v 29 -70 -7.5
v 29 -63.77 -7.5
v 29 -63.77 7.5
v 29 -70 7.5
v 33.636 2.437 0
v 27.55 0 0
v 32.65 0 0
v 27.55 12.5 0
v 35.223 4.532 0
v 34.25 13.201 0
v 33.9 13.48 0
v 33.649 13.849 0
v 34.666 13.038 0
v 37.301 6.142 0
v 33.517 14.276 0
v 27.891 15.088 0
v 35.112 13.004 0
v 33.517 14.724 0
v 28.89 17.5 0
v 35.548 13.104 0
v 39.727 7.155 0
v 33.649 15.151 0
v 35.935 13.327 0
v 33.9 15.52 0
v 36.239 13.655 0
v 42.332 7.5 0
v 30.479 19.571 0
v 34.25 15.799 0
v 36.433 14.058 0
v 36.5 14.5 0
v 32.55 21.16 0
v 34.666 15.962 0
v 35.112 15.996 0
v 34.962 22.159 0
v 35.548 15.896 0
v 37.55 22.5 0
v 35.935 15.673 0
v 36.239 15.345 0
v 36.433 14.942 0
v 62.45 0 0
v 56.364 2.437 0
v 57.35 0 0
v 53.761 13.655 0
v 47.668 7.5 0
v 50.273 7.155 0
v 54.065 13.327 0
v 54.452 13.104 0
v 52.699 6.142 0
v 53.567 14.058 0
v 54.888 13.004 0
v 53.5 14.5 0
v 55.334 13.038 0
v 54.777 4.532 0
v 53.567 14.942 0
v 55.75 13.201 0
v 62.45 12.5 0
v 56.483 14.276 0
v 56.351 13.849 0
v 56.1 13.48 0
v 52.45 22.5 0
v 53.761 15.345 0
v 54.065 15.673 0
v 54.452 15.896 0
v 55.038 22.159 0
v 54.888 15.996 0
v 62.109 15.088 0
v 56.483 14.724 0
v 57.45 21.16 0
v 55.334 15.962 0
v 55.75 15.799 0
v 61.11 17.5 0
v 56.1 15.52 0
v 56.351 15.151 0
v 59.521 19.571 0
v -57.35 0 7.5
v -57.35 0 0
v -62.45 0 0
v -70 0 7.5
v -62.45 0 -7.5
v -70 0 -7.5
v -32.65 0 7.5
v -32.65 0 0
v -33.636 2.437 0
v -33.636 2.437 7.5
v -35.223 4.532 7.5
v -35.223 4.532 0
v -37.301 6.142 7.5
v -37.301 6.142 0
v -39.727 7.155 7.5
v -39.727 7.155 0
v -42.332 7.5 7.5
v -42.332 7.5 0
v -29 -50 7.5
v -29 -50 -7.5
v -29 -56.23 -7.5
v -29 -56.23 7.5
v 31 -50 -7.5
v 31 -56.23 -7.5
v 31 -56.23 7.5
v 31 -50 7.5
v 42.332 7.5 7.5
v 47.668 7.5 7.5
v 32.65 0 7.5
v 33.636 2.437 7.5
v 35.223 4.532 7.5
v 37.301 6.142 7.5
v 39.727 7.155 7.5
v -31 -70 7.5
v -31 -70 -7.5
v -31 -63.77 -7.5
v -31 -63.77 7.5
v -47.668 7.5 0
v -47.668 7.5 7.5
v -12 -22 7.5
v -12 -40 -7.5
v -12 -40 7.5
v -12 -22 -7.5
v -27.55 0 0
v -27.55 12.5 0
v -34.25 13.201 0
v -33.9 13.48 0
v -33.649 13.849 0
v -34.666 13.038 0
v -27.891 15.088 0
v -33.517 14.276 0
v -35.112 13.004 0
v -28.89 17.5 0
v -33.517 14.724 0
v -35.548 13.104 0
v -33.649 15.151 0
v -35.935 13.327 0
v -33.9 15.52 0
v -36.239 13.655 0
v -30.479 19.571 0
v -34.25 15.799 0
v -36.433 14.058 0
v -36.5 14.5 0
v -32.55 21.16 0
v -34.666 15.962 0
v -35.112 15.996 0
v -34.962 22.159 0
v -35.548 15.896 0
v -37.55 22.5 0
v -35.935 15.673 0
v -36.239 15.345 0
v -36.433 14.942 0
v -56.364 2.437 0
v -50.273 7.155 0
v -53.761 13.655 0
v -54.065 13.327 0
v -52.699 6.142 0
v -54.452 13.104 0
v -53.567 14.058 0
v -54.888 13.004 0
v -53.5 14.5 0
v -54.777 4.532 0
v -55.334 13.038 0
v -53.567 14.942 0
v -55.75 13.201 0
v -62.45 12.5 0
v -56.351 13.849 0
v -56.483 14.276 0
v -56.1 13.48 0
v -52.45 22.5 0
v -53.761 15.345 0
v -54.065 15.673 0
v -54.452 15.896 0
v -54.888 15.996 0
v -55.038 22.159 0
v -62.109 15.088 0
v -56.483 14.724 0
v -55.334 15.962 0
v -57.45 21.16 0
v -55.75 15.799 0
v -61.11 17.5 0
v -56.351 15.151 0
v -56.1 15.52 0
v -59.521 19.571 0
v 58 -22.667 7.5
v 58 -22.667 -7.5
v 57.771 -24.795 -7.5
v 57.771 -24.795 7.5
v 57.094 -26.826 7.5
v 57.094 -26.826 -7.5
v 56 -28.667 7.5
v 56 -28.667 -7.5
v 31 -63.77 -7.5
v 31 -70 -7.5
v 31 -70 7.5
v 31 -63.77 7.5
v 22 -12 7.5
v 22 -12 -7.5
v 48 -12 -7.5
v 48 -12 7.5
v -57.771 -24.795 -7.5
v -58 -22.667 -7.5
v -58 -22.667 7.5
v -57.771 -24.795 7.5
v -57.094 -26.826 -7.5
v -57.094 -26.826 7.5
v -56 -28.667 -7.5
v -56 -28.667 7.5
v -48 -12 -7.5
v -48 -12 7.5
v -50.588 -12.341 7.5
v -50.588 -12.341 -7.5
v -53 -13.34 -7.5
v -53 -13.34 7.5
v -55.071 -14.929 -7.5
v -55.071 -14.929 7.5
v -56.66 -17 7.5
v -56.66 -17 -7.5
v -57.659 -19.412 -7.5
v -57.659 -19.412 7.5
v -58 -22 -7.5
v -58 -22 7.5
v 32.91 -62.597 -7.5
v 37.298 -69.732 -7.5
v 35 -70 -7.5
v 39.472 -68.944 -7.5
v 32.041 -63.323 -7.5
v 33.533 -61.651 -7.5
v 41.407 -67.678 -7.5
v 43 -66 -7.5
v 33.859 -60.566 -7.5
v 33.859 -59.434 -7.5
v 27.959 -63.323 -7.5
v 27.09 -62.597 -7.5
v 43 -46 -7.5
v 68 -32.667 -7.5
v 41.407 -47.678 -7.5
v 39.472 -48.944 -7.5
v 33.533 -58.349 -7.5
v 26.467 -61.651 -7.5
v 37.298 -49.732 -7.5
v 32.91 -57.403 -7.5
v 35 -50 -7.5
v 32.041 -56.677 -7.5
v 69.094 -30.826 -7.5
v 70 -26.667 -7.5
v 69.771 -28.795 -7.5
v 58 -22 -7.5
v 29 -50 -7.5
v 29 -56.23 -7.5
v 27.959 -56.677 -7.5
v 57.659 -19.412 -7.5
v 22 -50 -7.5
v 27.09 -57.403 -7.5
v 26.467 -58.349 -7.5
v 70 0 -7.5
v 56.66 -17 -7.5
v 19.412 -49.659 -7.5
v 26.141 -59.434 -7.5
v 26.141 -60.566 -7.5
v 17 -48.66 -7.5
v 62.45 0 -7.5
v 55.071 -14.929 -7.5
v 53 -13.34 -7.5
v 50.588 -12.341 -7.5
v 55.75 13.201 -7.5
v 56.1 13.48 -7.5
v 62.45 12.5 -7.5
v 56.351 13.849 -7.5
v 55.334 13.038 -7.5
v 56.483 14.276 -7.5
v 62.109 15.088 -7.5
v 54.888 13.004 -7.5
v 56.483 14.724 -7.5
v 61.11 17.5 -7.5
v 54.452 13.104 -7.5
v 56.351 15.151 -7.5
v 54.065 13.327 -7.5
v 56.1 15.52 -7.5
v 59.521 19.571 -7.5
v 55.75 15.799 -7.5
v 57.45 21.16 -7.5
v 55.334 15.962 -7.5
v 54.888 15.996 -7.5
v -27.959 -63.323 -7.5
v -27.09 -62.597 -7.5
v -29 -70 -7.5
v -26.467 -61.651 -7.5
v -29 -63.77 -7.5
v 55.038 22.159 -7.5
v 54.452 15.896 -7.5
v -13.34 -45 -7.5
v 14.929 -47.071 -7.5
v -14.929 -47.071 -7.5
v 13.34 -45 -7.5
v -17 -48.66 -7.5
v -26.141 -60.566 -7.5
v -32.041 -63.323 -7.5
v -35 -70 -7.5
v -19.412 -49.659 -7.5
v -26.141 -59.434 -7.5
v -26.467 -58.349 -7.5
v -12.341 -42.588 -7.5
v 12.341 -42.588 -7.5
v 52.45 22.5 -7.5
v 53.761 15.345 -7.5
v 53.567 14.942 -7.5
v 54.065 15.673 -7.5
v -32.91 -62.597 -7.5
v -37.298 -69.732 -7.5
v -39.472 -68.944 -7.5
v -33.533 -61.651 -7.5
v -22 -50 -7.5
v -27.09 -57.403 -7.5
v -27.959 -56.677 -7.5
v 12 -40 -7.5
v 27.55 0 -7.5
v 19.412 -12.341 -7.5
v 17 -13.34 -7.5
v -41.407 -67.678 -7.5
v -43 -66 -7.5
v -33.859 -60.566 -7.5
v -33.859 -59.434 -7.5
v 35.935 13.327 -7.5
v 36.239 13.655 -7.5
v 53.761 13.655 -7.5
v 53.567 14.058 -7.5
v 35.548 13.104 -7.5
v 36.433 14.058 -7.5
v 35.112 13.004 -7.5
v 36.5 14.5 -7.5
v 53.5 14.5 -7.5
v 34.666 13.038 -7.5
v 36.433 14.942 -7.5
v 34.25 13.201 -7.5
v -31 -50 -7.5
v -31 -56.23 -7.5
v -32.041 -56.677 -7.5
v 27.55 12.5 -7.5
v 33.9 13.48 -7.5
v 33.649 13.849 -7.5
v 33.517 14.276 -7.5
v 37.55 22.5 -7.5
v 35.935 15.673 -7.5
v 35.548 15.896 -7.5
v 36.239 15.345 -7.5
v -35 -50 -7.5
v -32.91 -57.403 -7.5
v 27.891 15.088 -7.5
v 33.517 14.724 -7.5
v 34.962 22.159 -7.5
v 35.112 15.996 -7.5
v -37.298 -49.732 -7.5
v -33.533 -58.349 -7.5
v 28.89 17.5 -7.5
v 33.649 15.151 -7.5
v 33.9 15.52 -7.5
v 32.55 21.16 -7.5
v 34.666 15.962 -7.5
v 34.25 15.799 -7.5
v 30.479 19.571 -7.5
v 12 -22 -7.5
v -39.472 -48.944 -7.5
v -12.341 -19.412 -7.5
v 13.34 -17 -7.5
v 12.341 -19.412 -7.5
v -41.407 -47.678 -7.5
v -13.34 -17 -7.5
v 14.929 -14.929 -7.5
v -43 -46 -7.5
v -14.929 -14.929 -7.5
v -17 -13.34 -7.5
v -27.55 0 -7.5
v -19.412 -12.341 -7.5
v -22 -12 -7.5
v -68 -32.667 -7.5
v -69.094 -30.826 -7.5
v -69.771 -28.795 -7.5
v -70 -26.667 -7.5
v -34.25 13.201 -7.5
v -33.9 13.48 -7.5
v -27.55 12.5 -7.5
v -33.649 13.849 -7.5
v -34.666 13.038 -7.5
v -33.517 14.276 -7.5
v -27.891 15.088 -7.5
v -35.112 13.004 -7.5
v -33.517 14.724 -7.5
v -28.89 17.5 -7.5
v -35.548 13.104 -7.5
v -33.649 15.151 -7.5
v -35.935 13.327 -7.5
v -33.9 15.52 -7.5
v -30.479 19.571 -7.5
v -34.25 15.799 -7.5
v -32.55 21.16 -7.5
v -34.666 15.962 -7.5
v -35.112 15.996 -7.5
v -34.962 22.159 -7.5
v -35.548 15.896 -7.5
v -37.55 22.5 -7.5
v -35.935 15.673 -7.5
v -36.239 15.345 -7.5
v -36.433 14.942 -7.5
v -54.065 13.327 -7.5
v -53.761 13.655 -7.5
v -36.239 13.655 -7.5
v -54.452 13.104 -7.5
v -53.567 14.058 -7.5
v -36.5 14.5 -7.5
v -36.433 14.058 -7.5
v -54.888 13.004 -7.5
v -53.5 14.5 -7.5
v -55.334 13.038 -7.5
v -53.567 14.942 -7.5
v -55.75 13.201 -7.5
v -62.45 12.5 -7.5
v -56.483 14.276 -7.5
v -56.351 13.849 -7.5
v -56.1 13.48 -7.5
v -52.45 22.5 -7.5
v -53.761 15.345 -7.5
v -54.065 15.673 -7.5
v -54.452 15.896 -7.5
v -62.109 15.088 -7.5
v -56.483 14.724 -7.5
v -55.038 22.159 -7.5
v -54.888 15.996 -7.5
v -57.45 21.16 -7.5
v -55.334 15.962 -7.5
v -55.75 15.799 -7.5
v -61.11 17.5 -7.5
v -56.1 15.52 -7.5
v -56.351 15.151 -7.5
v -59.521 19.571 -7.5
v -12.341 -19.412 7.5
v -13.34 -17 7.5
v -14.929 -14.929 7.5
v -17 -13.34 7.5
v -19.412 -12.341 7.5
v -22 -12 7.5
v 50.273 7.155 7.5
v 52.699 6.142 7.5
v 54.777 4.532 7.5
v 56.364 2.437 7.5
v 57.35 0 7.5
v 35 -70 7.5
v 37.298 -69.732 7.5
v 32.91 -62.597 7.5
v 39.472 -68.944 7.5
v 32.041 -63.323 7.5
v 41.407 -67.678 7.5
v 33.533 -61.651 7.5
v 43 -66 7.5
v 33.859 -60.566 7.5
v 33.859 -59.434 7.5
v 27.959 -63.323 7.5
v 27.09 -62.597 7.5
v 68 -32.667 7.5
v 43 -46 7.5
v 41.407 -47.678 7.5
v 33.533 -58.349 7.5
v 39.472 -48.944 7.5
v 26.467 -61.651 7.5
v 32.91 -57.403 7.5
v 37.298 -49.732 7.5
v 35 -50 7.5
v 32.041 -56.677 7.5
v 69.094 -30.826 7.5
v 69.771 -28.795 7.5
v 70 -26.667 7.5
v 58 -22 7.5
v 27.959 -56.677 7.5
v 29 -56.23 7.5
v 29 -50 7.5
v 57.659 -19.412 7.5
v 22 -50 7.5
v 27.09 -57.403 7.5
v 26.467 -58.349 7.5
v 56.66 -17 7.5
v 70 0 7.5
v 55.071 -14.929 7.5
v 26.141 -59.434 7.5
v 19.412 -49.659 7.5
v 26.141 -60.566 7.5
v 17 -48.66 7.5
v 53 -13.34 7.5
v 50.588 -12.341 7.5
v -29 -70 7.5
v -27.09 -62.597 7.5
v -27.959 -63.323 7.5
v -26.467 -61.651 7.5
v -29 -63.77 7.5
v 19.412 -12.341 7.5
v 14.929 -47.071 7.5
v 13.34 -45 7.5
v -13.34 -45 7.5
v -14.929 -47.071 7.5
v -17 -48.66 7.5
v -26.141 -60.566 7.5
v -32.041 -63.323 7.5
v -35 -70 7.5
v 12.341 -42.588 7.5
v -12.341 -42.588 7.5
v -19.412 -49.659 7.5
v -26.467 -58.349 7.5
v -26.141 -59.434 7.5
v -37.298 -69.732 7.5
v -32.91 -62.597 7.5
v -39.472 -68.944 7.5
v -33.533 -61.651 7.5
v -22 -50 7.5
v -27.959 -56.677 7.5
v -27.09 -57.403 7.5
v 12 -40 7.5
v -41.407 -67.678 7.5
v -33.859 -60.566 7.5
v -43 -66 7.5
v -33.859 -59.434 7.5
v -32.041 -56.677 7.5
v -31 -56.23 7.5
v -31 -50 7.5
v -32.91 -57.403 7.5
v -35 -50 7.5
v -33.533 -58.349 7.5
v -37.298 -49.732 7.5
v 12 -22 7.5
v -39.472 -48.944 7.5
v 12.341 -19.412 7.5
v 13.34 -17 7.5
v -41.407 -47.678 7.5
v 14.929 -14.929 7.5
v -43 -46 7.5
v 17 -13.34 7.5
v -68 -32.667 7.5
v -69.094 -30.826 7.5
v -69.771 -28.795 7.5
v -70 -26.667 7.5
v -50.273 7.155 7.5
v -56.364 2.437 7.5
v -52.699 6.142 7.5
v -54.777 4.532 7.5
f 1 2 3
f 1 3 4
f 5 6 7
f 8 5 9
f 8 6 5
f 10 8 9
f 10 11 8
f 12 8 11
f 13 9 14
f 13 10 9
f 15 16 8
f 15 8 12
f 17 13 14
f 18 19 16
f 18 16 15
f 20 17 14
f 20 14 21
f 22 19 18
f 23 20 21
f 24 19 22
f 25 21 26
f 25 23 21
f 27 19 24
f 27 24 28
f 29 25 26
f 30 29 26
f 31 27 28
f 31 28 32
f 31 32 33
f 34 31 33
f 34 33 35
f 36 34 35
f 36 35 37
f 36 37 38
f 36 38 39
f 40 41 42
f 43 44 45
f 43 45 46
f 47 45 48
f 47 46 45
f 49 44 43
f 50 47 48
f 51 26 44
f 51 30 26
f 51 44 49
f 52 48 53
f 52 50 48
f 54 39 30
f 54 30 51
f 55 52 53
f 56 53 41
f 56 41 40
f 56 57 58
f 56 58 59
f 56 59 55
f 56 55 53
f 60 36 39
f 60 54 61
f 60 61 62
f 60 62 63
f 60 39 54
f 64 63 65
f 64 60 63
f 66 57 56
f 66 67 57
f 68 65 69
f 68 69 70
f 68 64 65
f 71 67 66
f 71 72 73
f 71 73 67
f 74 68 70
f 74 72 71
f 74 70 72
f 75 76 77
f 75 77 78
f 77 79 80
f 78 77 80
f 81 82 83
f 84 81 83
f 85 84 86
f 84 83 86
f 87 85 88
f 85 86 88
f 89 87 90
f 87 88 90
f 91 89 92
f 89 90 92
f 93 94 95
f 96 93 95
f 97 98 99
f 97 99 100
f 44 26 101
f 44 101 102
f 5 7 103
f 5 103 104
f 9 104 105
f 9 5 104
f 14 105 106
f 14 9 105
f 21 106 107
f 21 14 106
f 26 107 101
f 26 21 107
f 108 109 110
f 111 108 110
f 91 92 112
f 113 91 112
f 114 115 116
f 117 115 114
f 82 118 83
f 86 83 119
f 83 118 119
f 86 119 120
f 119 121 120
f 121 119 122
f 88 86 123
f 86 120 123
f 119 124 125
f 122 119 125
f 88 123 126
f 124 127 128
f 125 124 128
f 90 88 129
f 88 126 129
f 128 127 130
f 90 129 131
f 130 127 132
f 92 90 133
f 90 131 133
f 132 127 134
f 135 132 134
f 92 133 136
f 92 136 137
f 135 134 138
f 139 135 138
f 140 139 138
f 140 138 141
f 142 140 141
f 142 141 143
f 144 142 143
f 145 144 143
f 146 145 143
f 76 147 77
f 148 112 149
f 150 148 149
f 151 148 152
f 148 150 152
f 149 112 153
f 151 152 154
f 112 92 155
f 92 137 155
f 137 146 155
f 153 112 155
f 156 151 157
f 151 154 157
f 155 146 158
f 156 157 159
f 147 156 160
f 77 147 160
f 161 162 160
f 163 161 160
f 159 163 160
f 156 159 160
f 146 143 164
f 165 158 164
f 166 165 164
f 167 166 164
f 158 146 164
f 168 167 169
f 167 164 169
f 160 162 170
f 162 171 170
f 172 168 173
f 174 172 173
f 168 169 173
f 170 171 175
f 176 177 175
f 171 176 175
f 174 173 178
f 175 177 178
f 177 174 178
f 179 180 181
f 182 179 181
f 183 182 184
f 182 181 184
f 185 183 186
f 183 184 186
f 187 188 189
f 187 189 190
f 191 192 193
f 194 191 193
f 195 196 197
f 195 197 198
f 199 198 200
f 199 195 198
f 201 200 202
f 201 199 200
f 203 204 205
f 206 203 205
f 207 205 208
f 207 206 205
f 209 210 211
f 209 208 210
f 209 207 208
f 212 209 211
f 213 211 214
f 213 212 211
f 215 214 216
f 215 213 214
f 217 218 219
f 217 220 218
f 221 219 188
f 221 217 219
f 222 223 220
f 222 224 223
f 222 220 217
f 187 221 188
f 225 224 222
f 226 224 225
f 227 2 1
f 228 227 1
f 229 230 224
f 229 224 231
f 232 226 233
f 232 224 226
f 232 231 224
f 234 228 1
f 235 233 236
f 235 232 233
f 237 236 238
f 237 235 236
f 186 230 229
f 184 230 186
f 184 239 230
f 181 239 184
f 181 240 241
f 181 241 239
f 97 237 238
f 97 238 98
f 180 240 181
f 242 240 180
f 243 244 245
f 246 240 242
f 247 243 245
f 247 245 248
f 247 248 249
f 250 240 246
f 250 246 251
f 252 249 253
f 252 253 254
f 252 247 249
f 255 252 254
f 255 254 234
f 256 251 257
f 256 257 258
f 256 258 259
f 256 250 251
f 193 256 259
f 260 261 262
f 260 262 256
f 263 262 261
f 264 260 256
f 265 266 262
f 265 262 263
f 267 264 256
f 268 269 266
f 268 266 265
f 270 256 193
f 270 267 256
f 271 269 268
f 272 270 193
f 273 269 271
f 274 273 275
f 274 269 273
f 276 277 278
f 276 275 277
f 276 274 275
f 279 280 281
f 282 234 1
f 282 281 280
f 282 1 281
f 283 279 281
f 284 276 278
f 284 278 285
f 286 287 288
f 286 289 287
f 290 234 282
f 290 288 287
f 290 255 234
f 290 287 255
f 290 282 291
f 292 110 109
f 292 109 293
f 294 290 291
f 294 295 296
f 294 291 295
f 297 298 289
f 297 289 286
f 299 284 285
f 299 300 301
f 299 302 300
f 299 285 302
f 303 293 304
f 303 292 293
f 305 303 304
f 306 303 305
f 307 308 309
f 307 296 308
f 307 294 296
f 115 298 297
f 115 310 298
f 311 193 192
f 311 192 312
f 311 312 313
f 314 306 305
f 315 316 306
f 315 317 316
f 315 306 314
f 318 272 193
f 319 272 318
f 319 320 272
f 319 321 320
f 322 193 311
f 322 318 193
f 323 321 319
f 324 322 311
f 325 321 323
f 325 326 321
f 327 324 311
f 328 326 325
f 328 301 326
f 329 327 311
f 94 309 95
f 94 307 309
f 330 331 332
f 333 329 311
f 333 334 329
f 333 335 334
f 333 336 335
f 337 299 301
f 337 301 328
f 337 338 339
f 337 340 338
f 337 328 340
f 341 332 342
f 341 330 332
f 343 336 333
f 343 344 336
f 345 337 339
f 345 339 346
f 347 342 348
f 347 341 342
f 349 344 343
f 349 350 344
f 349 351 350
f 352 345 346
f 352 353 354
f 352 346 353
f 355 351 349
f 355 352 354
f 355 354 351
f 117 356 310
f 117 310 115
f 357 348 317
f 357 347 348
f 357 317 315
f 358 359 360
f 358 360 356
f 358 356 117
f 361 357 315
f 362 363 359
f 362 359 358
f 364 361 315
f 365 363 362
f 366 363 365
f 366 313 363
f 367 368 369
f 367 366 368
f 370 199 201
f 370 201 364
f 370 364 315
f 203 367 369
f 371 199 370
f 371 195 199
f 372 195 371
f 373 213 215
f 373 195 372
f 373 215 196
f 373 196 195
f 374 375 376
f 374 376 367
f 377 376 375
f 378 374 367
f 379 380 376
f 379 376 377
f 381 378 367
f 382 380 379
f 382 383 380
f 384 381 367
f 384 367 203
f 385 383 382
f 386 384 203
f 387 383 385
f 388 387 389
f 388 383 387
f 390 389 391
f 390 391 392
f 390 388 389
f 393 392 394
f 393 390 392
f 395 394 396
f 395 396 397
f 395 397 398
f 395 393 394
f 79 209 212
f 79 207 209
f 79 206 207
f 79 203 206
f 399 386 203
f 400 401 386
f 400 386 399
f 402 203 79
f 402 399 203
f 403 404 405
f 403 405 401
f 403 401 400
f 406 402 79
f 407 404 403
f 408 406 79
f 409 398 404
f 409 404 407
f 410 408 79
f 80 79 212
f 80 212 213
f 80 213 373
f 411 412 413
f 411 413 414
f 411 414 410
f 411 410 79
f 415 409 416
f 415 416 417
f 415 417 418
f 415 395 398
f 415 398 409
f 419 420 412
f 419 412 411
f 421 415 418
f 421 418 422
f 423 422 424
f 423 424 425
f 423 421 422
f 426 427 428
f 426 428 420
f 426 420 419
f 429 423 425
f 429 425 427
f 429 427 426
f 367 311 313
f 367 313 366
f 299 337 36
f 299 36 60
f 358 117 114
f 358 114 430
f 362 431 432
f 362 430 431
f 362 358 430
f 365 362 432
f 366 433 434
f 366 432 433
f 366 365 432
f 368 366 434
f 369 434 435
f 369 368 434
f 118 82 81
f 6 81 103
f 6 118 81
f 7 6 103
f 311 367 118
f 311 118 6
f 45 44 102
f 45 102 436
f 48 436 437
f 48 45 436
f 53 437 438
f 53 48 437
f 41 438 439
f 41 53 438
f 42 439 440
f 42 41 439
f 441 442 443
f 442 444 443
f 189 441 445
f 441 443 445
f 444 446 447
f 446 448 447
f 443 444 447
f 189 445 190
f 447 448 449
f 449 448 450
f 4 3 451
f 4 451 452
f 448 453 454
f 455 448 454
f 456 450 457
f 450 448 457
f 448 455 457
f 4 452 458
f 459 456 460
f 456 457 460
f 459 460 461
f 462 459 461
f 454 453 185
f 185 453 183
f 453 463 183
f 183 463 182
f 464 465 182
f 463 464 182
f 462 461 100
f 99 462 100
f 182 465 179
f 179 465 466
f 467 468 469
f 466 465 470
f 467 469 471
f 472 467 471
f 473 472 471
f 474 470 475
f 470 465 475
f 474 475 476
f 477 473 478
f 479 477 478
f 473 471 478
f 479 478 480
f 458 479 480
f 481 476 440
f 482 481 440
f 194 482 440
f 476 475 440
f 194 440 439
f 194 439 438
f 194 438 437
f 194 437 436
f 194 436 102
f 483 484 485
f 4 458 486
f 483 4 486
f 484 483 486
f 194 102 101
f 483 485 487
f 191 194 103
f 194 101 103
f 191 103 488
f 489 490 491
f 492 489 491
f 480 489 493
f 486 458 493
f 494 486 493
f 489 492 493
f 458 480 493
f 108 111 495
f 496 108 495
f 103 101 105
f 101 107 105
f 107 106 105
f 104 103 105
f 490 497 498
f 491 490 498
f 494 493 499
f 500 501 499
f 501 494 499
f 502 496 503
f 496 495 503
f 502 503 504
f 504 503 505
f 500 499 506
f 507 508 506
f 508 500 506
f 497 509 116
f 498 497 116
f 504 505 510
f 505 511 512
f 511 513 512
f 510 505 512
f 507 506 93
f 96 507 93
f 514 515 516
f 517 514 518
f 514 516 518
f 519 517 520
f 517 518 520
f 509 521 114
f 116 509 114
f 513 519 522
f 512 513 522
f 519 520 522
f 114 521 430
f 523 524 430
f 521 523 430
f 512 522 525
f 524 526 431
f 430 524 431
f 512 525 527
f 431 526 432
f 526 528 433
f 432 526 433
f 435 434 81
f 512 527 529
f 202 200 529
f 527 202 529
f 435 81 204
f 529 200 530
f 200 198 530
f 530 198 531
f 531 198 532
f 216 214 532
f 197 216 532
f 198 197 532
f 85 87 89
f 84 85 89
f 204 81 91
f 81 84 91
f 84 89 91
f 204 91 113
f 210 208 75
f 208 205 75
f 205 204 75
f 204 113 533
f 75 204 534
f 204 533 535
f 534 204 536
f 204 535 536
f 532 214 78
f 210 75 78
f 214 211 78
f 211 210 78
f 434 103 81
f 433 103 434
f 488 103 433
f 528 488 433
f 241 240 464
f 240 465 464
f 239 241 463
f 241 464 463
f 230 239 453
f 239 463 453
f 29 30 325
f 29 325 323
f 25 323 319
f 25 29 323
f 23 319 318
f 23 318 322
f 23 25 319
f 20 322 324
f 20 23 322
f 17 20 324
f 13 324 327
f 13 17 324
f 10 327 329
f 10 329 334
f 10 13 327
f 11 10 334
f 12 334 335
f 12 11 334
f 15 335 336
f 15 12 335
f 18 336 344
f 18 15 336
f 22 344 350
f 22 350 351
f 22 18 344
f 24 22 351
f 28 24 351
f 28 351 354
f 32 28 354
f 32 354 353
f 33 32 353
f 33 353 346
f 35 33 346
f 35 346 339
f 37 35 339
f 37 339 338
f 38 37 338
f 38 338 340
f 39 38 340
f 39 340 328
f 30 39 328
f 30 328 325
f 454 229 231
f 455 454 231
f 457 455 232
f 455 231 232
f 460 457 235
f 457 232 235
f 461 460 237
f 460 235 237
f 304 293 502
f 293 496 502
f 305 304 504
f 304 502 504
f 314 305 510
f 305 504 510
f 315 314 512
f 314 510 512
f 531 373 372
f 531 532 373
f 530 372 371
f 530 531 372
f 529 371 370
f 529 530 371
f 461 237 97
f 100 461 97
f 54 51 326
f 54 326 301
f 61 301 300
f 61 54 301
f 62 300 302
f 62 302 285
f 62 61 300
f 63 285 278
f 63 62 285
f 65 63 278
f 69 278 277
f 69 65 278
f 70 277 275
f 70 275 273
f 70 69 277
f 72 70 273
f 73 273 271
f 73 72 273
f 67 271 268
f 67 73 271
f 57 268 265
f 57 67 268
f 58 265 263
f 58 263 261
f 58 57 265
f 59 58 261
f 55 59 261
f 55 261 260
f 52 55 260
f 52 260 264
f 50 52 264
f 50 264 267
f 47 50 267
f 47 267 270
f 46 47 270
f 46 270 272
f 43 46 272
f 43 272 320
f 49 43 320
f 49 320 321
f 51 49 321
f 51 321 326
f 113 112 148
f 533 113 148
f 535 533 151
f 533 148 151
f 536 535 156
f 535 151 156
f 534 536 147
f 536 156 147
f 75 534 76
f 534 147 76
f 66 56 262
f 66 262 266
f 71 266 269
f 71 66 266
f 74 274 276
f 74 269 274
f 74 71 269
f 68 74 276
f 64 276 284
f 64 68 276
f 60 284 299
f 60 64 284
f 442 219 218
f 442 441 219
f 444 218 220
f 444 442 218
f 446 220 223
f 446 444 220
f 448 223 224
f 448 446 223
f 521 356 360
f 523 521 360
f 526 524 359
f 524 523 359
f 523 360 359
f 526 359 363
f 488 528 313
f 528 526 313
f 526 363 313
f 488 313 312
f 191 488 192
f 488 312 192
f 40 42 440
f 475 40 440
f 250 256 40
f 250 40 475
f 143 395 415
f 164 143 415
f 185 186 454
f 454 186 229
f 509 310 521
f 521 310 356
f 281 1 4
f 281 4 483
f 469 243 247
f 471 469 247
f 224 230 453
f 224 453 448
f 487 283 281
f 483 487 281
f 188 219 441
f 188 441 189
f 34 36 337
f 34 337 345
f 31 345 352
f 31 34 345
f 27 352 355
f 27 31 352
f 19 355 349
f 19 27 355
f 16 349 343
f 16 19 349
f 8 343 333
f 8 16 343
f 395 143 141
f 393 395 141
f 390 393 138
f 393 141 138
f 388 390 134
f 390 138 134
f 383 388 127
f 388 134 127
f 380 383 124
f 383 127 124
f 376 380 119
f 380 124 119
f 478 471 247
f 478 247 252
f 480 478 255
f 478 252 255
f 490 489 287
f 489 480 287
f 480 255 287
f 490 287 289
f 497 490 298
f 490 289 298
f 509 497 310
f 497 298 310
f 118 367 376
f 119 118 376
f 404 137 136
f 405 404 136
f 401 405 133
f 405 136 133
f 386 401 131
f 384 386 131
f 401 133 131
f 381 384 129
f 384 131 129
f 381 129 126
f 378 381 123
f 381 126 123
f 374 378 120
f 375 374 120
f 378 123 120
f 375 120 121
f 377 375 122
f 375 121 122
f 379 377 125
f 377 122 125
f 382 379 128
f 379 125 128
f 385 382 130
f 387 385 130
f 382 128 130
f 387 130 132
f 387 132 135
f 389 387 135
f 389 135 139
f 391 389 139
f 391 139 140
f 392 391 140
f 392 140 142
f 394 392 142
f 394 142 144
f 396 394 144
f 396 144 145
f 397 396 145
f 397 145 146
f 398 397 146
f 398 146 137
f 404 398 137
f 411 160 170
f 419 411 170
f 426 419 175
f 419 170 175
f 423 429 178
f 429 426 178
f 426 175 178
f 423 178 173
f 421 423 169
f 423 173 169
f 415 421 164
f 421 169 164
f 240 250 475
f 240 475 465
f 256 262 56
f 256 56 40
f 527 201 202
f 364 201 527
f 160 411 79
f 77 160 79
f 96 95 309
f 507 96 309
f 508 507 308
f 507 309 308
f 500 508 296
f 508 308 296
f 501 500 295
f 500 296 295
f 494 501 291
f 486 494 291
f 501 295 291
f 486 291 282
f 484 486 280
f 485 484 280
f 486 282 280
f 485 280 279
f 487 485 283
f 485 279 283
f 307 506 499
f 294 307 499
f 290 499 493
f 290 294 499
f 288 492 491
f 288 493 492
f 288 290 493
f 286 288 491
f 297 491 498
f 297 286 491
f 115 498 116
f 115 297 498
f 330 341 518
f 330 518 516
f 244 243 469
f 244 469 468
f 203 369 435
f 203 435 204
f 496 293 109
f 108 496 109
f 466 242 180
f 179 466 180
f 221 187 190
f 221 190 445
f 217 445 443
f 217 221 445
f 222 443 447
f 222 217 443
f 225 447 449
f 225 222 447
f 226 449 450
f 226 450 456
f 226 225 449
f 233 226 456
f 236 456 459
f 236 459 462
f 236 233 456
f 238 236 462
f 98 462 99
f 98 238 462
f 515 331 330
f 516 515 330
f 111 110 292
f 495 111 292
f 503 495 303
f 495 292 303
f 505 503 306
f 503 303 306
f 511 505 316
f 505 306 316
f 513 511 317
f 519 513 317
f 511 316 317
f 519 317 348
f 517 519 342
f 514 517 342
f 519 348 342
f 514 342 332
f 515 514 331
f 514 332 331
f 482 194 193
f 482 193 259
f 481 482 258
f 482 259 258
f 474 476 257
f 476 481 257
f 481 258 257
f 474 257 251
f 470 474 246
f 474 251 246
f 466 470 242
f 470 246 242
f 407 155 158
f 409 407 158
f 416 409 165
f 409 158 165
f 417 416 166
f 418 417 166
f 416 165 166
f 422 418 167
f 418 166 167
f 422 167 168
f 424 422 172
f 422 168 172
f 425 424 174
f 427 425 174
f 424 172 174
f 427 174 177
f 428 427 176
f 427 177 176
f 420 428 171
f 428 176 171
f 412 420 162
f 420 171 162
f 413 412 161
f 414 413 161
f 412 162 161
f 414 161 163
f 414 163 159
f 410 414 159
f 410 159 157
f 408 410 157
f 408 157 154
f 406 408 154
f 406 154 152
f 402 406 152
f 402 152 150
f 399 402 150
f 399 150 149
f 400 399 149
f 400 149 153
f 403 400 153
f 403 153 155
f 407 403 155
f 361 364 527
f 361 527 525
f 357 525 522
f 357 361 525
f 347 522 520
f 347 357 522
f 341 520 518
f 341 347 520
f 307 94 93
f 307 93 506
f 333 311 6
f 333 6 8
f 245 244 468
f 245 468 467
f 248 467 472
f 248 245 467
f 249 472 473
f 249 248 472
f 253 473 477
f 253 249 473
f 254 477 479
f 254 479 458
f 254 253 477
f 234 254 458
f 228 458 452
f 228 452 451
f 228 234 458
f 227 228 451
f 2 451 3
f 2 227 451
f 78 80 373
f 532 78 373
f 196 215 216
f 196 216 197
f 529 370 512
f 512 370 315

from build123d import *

# Parameters (mm, degrees)
BOSS_EXTRU_1_DEPTH           = 7.5
BOSS_EXTRU_1_DEPTH_BACK      = 7.5
ENL_V_MAT_EXTRU_1_DEPTH      = 7.5
CONG_1_R                     = 10
CONG_2_R                     = 10
ENL_V_MAT_EXTRU_3_DEPTH      = 100.278648258
ENL_V_MAT_EXTRU_3_DEPTH_BACK = 100.278648258
ENL_V_MAT_EXTRU_2_DEPTH      = 100.278648258
ENL_V_MAT_EXTRU_2_DEPTH_BACK = 100.278648258
ESQUISSE8_R                  = 1.5
ENL_V_MAT_EXTRU_4_DEPTH      = 100.278648258


with BuildPart() as part:
    # Esquisse1 → Boss.-Extru.1 (new, two sides: drawn at the far end of the back side and taken through both)
    with BuildSketch(Plane.XY.offset(-BOSS_EXTRU_1_DEPTH_BACK)):
        Polygon((-62.45, 0), (-70, 0), (-70, -30), (-40, -70), (0, -70), (0, 0), (-27.55, 0), (-27.55, 22.5), (-62.45, 22.5), align=None)
    extrude(amount=BOSS_EXTRU_1_DEPTH + BOSS_EXTRU_1_DEPTH_BACK)

    # Esquisse3 → Enlèv. mat.-Extru.1 (cut)
    with BuildSketch(Plane.XY):
        Polygon((-32.65, 0), (-32.65, 7.5), (-57.35, 7.5), (-57.35, 0), (-62.45, 0), (-62.45, 22.5), (-27.55, 22.5), (-27.55, 0), align=None)
    extrude(amount=ENL_V_MAT_EXTRU_1_DEPTH, mode=Mode.SUBTRACT)

    # Congé1
    # the kernel refuses this fillet: 10 mm, written as the material it takes off along each edge
    with BuildSketch(Plane(origin=(-62.45, 22.5, 25), x_dir=(1, 0, 0), z_dir=(0, 0, -1))) as cong_1_piece_1:
        with BuildLine():
            CenterArc((CONG_1_R, CONG_1_R), CONG_1_R, 180, 90)
            Line((0, CONG_1_R), (0, 0))
            Line((0, 0), (CONG_1_R, 0))
        make_face()
    extrude(amount=57.5, mode=Mode.SUBTRACT)
    with BuildSketch(Plane(origin=(-57.35, 7.5, 0), x_dir=(1, 0, 0), z_dir=(0, 0, 1))) as cong_1_piece_2:
        with BuildLine():
            CenterArc((9.682458366, -10), CONG_1_R, 90, 75.522487814)
            Line((0, -7.5), (0, 0))
            Line((0, 0), (9.682458366, 0))
        make_face()
    extrude(amount=31.706145914, mode=Mode.SUBTRACT)
    with BuildSketch(Plane(origin=(-32.65, 7.5, 0), x_dir=(0, -1, 0), z_dir=(0, 0, 1))) as cong_1_piece_3:
        with BuildLine():
            CenterArc((10, -9.682458366), CONG_1_R, 104.477512186, 75.522487814)
            Line((0, -9.682458366), (0, 0))
            Line((0, 0), (7.5, 0))
        make_face()
    extrude(amount=31.706145914, mode=Mode.SUBTRACT)
    with BuildSketch(Plane(origin=(-27.55, 22.5, 25), x_dir=(-1, 0, 0), z_dir=(0, 0, -1))) as cong_1_piece_4:
        with BuildLine():
            CenterArc((CONG_1_R, -CONG_1_R), CONG_1_R, 90, 90)
            Line((0, -CONG_1_R), (0, 0))
            Line((0, 0), (CONG_1_R, 0))
        make_face()
    extrude(amount=57.5, mode=Mode.SUBTRACT)

    # Congé2
    cong_2_edges = [part.edges().sort_by_distance(p)[0] for p in [
        (-40, -70, 0),
        (-70, -30, 0),
    ]]
    fillet(cong_2_edges, radius=CONG_2_R)

    # Esquisse6 → Enlèv. mat.-Extru.3 (cut, two sides: drawn at the far end of the back side and taken through both)
    with BuildSketch(Plane.XY.offset(-ENL_V_MAT_EXTRU_3_DEPTH_BACK)):
        with BuildLine():
            Line((-58, -22), (-58, -22.666666667))
            ThreePointArc((-58, -22.666666667), (-57.486832981, -25.828944327), (-56, -28.666666667))
            Line((-56, -28.666666667), (-43, -46))
            ThreePointArc((-43, -46), (-39.472135955, -48.94427191), (-35, -50))
            Line((-35, -50), (-22, -50))
            ThreePointArc((-22, -50), (-14.928932188, -47.071067812), (-12, -40))
            Line((-12, -40), (-12, -22))
            ThreePointArc((-12, -22), (-14.928932188, -14.928932188), (-22, -12))
            Line((-22, -12), (-48, -12))
            ThreePointArc((-48, -12), (-55.071067812, -14.928932188), (-58, -22))
        make_face()
    extrude(amount=ENL_V_MAT_EXTRU_3_DEPTH + ENL_V_MAT_EXTRU_3_DEPTH_BACK, mode=Mode.SUBTRACT)

    # Esquisse5 → Enlèv. mat.-Extru.2 (cut, two sides: drawn at the far end of the back side and taken through both)
    with BuildSketch(Plane.XY.offset(-ENL_V_MAT_EXTRU_2_DEPTH_BACK)):
        with BuildLine():
            Line((-29, -72.5), (-31, -72.5))
            Line((-31, -72.5), (-31, -63.769615365))
            ThreePointArc((-31, -63.769615365), (-33.9, -60), (-31, -56.230384635))
            Line((-31, -56.230384635), (-31, -47.5))
            Line((-31, -47.5), (-29, -47.5))
            Line((-29, -47.5), (-29, -56.230384635))
            ThreePointArc((-29, -56.230384635), (-26.1, -60), (-29, -63.769615365))
            Line((-29, -63.769615365), (-29, -72.5))
        make_face()
    extrude(amount=ENL_V_MAT_EXTRU_2_DEPTH + ENL_V_MAT_EXTRU_2_DEPTH_BACK, mode=Mode.SUBTRACT)

    # Esquisse8 → Enlèv. mat.-Extru.4 (cut, through all)
    with BuildSketch(Plane.XY):
        with Locations((-55, 14.5)):
            Circle(ESQUISSE8_R)
        with Locations(Location((-35, 14.5, 0), (0, 0, 180))):
            Circle(ESQUISSE8_R)
    extrude(amount=-ENL_V_MAT_EXTRU_4_DEPTH, mode=Mode.SUBTRACT)

    # Symétrie1: part across plane


with BuildPart() as part_1:
    add(part.part)
    add(part.part.mirror(Plane(origin=(0, 0, -7.5), x_dir=(0, 0, 1), z_dir=(1, 0, 0))))


solid = part_1.part
